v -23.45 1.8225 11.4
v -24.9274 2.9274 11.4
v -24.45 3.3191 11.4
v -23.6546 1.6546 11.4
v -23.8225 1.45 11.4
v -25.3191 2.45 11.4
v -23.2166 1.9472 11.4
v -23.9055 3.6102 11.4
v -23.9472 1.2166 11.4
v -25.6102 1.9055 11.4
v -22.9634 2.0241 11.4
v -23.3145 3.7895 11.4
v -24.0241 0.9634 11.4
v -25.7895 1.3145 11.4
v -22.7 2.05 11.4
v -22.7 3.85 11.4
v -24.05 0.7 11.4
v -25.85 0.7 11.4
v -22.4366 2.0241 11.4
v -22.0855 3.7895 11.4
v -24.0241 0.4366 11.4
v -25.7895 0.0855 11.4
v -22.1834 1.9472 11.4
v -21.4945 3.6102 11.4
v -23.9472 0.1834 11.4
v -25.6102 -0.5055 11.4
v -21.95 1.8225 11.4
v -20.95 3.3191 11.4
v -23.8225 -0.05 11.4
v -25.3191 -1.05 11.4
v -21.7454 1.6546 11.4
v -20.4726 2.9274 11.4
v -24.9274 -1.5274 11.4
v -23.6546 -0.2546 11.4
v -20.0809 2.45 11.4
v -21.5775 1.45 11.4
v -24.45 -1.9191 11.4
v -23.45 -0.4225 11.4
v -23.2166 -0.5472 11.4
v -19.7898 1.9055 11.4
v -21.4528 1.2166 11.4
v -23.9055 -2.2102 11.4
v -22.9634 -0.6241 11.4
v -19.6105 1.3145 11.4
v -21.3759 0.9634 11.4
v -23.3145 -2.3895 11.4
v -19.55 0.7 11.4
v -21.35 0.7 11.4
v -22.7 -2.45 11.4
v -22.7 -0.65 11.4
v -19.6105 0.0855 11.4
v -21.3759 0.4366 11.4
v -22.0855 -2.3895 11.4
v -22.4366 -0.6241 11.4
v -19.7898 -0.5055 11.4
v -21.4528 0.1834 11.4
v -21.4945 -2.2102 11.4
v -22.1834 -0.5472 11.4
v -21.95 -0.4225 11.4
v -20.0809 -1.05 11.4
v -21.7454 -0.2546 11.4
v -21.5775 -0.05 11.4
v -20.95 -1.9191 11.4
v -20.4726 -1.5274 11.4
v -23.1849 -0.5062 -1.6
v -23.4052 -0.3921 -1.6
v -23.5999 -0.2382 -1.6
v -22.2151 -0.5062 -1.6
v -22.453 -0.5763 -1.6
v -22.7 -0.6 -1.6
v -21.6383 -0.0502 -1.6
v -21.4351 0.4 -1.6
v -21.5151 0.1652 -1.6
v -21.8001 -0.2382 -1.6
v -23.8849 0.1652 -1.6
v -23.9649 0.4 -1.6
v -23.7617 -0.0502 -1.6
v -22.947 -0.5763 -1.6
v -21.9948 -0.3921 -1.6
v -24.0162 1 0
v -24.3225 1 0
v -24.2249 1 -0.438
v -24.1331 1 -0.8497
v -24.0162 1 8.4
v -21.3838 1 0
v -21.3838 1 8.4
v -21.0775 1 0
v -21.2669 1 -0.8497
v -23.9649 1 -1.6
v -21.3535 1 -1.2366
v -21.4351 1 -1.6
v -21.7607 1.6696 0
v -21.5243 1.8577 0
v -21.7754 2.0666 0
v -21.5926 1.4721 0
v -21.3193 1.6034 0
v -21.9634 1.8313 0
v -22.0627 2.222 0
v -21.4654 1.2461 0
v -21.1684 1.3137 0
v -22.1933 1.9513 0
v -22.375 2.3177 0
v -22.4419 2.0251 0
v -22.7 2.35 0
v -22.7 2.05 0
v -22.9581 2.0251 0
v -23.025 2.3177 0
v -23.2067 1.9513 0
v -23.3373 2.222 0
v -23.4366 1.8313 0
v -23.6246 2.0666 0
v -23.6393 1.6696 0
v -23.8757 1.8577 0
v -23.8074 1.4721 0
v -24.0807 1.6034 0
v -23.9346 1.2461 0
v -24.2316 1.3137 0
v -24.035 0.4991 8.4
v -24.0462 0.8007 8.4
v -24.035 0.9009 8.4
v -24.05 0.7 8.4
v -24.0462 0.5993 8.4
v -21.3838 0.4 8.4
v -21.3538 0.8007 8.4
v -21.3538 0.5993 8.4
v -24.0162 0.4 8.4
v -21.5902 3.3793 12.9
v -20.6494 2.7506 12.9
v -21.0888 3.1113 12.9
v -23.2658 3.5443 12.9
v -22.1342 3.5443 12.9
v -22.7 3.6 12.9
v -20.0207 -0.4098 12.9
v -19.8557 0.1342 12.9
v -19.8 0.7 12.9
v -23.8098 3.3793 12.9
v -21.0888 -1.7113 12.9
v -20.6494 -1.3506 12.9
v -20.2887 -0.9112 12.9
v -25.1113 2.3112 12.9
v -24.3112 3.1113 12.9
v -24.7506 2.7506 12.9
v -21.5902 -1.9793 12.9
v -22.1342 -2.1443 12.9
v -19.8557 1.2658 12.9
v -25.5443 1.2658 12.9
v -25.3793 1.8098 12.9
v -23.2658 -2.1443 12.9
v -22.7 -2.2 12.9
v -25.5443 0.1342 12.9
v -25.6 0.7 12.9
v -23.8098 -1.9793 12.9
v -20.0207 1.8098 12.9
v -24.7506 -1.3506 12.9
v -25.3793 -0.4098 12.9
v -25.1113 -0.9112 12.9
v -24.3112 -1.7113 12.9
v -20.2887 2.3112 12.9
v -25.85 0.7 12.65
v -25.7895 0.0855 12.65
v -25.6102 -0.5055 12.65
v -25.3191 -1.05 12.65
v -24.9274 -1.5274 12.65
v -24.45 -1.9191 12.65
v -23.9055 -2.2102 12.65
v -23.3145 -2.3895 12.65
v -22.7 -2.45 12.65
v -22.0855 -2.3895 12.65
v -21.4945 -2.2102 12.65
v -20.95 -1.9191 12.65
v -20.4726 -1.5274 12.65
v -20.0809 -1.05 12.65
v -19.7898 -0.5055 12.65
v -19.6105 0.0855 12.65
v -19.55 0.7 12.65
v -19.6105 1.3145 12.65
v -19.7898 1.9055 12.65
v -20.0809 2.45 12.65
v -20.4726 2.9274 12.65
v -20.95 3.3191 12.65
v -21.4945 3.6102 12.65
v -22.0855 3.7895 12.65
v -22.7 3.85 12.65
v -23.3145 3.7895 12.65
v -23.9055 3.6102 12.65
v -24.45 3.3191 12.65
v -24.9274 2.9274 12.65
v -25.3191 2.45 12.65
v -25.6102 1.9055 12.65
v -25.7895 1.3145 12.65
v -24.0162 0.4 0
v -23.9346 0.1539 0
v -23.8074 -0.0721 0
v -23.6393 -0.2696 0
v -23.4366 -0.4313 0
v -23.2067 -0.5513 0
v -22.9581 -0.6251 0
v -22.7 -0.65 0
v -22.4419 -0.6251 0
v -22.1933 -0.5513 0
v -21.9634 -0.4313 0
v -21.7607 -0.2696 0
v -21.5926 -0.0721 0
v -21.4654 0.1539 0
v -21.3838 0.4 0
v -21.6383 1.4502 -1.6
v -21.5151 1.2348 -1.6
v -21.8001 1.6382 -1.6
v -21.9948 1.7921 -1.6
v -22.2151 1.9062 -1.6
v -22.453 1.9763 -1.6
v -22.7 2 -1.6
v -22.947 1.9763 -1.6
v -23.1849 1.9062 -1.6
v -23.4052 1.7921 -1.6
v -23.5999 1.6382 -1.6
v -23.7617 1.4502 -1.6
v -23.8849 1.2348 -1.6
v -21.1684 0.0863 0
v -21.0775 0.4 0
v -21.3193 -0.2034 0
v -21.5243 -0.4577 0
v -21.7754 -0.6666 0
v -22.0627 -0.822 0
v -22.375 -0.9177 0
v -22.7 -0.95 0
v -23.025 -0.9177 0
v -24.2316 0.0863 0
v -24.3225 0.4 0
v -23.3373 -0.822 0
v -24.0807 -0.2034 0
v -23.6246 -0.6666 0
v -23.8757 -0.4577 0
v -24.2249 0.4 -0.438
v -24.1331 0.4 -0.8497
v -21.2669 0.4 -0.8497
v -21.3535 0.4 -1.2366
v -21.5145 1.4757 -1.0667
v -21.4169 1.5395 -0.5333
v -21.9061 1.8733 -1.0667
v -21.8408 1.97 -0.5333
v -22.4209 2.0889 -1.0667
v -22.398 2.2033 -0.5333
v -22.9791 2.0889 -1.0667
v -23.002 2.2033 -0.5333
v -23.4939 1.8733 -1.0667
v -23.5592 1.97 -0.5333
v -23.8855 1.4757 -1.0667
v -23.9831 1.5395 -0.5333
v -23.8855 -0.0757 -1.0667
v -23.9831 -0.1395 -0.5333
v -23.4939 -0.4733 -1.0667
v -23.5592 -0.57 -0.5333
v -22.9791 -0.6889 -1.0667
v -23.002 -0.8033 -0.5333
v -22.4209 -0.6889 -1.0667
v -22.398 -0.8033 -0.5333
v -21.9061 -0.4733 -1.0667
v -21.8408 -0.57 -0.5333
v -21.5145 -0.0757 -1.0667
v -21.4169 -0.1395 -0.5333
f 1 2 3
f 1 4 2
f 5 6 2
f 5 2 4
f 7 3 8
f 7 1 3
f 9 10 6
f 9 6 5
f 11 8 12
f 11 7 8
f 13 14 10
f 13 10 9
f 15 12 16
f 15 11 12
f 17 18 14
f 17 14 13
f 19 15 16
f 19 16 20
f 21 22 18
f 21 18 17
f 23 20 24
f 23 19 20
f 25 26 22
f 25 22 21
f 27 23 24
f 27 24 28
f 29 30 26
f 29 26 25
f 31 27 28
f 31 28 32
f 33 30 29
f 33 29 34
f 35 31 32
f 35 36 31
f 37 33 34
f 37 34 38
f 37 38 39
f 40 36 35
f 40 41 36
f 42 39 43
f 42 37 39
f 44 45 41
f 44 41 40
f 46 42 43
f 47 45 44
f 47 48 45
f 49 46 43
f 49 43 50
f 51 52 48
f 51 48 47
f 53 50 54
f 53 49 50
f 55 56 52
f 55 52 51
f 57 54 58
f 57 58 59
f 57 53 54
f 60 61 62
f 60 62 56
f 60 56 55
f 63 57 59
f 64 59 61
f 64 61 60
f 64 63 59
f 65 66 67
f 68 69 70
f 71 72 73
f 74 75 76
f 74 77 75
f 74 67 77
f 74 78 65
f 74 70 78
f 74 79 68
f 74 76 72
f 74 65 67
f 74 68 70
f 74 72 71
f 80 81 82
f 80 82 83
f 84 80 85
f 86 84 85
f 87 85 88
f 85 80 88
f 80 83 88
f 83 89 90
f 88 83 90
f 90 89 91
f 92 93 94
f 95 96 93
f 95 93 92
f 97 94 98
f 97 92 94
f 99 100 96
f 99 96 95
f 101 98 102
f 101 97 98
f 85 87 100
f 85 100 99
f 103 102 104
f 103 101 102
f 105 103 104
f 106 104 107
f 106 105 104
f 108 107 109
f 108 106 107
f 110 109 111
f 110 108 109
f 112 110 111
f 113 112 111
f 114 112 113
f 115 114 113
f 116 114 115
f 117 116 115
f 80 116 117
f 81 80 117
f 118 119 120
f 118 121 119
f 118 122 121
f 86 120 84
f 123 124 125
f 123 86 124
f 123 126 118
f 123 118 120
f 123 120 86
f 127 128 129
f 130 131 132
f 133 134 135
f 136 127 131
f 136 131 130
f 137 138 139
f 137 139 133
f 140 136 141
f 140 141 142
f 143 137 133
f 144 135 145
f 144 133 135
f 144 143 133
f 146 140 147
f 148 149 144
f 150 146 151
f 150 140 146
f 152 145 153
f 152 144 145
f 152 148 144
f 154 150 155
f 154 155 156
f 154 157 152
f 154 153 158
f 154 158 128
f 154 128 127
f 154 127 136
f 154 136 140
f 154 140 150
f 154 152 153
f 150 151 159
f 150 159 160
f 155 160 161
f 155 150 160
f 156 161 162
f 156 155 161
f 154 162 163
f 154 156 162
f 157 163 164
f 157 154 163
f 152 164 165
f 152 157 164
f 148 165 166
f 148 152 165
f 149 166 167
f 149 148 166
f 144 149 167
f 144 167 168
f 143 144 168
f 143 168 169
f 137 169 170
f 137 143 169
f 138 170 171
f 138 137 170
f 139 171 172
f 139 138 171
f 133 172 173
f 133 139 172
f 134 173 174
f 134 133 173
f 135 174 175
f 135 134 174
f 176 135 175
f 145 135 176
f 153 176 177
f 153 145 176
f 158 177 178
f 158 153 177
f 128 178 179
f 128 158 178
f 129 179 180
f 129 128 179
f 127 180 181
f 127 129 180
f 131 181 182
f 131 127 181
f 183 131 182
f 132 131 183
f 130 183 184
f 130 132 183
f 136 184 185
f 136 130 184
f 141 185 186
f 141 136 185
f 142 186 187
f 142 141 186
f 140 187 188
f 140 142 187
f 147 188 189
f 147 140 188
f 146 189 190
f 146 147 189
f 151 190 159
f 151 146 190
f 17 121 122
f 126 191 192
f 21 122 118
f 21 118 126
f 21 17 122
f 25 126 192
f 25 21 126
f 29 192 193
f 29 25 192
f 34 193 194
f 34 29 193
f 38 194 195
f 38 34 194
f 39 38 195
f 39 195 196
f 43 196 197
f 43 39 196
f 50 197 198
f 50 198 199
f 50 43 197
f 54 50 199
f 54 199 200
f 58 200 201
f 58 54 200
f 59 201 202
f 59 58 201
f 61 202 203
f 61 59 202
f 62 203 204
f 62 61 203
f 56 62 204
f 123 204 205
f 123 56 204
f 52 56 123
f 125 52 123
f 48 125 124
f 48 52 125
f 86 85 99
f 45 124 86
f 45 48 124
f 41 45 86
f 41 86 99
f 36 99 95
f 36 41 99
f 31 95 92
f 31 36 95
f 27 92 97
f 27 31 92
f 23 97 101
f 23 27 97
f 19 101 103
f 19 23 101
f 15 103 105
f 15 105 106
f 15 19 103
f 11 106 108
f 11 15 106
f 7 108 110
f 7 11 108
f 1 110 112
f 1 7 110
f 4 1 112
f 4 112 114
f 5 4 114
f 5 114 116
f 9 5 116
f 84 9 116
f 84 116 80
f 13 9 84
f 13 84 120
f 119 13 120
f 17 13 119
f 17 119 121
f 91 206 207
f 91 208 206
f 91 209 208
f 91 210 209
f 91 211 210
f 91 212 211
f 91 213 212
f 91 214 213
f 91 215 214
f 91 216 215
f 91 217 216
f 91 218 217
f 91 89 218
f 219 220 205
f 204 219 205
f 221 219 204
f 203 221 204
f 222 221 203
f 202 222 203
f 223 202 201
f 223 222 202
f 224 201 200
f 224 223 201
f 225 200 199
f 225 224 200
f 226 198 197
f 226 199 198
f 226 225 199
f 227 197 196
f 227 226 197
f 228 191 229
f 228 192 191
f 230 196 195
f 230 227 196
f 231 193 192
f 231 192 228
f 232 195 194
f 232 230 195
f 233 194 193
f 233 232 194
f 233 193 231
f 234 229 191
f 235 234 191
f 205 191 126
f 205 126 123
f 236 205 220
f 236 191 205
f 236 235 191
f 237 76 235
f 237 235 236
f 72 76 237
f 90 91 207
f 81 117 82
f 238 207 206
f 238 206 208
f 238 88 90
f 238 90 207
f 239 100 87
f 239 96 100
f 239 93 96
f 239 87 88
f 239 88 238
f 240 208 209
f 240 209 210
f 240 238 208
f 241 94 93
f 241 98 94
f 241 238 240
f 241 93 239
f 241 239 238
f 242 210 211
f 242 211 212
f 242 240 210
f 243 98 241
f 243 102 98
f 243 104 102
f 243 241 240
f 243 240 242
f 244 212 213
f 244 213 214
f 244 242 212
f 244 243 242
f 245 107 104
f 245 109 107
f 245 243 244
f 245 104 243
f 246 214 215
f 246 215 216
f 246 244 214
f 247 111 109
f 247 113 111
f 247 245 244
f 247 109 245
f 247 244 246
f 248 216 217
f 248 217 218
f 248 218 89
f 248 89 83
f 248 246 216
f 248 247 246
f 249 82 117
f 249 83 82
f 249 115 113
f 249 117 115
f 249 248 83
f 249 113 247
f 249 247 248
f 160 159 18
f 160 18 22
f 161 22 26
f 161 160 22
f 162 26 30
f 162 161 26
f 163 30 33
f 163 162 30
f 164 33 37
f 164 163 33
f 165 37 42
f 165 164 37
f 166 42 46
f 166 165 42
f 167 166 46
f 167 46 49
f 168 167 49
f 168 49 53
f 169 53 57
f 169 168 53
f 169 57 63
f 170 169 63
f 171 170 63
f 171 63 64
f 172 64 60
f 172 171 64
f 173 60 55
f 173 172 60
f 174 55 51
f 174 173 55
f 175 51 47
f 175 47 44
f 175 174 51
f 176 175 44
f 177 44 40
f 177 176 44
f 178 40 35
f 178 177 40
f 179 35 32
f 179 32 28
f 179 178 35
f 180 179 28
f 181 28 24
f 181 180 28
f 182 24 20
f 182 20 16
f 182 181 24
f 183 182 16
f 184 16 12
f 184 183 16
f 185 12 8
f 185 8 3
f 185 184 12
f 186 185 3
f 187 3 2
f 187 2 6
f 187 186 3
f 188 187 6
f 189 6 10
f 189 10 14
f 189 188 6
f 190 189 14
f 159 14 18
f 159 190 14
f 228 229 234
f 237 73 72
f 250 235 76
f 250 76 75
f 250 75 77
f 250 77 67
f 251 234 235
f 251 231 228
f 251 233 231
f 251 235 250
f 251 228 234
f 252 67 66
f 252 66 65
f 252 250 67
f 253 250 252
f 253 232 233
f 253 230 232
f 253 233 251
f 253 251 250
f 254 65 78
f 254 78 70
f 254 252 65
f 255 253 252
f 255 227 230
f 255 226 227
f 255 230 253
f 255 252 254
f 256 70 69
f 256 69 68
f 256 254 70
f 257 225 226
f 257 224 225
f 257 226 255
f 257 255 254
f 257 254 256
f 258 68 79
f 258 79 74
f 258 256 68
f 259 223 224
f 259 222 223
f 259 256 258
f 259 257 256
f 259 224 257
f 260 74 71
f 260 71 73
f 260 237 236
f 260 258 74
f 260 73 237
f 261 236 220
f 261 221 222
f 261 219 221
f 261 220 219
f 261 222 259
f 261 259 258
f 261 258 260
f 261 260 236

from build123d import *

# Parameters (mm, degrees)
CHAMFER_SIZE = 0.25
SKETCH016_W  = 3.3
SKETCH016_H  = 0.6
POCKET_DEPTH = 10


with BuildPart() as part:
    # Sketch → Revolution (revolve)
    with BuildSketch(Plane.XZ):
        Polygon((-1.35, 1.6), (-1.35, 13), (-3.15, 13), (-3.15, 14.5), (0, 14.5), (0, 0), (-1.3, 0), (-1.65, 1.6), align=None)
    revolve(axis=Axis((0, 0, 0), (0, 0, 1)))

    # Chamfer
    chamfer_edges = [part.edges().sort_by_distance(p)[0] for p in [
        (3.15, 0, 14.5),
    ]]
    chamfer(chamfer_edges, length=CHAMFER_SIZE)

    # Sketch016 (on Face8 of Chamfer) → Pocket (cut)
    with BuildSketch(Plane(origin=(0, 0, 0), x_dir=(1, 0, 0), z_dir=(0, 0, -1))):
        Rectangle(SKETCH016_W, SKETCH016_H)
    extrude(amount=-POCKET_DEPTH, mode=Mode.SUBTRACT)


with BuildPart() as part_1:
    # Body placement: moved
    add(part.part.moved(Location((-22.7, 0.7, -1.6))))


solid = part_1.part
